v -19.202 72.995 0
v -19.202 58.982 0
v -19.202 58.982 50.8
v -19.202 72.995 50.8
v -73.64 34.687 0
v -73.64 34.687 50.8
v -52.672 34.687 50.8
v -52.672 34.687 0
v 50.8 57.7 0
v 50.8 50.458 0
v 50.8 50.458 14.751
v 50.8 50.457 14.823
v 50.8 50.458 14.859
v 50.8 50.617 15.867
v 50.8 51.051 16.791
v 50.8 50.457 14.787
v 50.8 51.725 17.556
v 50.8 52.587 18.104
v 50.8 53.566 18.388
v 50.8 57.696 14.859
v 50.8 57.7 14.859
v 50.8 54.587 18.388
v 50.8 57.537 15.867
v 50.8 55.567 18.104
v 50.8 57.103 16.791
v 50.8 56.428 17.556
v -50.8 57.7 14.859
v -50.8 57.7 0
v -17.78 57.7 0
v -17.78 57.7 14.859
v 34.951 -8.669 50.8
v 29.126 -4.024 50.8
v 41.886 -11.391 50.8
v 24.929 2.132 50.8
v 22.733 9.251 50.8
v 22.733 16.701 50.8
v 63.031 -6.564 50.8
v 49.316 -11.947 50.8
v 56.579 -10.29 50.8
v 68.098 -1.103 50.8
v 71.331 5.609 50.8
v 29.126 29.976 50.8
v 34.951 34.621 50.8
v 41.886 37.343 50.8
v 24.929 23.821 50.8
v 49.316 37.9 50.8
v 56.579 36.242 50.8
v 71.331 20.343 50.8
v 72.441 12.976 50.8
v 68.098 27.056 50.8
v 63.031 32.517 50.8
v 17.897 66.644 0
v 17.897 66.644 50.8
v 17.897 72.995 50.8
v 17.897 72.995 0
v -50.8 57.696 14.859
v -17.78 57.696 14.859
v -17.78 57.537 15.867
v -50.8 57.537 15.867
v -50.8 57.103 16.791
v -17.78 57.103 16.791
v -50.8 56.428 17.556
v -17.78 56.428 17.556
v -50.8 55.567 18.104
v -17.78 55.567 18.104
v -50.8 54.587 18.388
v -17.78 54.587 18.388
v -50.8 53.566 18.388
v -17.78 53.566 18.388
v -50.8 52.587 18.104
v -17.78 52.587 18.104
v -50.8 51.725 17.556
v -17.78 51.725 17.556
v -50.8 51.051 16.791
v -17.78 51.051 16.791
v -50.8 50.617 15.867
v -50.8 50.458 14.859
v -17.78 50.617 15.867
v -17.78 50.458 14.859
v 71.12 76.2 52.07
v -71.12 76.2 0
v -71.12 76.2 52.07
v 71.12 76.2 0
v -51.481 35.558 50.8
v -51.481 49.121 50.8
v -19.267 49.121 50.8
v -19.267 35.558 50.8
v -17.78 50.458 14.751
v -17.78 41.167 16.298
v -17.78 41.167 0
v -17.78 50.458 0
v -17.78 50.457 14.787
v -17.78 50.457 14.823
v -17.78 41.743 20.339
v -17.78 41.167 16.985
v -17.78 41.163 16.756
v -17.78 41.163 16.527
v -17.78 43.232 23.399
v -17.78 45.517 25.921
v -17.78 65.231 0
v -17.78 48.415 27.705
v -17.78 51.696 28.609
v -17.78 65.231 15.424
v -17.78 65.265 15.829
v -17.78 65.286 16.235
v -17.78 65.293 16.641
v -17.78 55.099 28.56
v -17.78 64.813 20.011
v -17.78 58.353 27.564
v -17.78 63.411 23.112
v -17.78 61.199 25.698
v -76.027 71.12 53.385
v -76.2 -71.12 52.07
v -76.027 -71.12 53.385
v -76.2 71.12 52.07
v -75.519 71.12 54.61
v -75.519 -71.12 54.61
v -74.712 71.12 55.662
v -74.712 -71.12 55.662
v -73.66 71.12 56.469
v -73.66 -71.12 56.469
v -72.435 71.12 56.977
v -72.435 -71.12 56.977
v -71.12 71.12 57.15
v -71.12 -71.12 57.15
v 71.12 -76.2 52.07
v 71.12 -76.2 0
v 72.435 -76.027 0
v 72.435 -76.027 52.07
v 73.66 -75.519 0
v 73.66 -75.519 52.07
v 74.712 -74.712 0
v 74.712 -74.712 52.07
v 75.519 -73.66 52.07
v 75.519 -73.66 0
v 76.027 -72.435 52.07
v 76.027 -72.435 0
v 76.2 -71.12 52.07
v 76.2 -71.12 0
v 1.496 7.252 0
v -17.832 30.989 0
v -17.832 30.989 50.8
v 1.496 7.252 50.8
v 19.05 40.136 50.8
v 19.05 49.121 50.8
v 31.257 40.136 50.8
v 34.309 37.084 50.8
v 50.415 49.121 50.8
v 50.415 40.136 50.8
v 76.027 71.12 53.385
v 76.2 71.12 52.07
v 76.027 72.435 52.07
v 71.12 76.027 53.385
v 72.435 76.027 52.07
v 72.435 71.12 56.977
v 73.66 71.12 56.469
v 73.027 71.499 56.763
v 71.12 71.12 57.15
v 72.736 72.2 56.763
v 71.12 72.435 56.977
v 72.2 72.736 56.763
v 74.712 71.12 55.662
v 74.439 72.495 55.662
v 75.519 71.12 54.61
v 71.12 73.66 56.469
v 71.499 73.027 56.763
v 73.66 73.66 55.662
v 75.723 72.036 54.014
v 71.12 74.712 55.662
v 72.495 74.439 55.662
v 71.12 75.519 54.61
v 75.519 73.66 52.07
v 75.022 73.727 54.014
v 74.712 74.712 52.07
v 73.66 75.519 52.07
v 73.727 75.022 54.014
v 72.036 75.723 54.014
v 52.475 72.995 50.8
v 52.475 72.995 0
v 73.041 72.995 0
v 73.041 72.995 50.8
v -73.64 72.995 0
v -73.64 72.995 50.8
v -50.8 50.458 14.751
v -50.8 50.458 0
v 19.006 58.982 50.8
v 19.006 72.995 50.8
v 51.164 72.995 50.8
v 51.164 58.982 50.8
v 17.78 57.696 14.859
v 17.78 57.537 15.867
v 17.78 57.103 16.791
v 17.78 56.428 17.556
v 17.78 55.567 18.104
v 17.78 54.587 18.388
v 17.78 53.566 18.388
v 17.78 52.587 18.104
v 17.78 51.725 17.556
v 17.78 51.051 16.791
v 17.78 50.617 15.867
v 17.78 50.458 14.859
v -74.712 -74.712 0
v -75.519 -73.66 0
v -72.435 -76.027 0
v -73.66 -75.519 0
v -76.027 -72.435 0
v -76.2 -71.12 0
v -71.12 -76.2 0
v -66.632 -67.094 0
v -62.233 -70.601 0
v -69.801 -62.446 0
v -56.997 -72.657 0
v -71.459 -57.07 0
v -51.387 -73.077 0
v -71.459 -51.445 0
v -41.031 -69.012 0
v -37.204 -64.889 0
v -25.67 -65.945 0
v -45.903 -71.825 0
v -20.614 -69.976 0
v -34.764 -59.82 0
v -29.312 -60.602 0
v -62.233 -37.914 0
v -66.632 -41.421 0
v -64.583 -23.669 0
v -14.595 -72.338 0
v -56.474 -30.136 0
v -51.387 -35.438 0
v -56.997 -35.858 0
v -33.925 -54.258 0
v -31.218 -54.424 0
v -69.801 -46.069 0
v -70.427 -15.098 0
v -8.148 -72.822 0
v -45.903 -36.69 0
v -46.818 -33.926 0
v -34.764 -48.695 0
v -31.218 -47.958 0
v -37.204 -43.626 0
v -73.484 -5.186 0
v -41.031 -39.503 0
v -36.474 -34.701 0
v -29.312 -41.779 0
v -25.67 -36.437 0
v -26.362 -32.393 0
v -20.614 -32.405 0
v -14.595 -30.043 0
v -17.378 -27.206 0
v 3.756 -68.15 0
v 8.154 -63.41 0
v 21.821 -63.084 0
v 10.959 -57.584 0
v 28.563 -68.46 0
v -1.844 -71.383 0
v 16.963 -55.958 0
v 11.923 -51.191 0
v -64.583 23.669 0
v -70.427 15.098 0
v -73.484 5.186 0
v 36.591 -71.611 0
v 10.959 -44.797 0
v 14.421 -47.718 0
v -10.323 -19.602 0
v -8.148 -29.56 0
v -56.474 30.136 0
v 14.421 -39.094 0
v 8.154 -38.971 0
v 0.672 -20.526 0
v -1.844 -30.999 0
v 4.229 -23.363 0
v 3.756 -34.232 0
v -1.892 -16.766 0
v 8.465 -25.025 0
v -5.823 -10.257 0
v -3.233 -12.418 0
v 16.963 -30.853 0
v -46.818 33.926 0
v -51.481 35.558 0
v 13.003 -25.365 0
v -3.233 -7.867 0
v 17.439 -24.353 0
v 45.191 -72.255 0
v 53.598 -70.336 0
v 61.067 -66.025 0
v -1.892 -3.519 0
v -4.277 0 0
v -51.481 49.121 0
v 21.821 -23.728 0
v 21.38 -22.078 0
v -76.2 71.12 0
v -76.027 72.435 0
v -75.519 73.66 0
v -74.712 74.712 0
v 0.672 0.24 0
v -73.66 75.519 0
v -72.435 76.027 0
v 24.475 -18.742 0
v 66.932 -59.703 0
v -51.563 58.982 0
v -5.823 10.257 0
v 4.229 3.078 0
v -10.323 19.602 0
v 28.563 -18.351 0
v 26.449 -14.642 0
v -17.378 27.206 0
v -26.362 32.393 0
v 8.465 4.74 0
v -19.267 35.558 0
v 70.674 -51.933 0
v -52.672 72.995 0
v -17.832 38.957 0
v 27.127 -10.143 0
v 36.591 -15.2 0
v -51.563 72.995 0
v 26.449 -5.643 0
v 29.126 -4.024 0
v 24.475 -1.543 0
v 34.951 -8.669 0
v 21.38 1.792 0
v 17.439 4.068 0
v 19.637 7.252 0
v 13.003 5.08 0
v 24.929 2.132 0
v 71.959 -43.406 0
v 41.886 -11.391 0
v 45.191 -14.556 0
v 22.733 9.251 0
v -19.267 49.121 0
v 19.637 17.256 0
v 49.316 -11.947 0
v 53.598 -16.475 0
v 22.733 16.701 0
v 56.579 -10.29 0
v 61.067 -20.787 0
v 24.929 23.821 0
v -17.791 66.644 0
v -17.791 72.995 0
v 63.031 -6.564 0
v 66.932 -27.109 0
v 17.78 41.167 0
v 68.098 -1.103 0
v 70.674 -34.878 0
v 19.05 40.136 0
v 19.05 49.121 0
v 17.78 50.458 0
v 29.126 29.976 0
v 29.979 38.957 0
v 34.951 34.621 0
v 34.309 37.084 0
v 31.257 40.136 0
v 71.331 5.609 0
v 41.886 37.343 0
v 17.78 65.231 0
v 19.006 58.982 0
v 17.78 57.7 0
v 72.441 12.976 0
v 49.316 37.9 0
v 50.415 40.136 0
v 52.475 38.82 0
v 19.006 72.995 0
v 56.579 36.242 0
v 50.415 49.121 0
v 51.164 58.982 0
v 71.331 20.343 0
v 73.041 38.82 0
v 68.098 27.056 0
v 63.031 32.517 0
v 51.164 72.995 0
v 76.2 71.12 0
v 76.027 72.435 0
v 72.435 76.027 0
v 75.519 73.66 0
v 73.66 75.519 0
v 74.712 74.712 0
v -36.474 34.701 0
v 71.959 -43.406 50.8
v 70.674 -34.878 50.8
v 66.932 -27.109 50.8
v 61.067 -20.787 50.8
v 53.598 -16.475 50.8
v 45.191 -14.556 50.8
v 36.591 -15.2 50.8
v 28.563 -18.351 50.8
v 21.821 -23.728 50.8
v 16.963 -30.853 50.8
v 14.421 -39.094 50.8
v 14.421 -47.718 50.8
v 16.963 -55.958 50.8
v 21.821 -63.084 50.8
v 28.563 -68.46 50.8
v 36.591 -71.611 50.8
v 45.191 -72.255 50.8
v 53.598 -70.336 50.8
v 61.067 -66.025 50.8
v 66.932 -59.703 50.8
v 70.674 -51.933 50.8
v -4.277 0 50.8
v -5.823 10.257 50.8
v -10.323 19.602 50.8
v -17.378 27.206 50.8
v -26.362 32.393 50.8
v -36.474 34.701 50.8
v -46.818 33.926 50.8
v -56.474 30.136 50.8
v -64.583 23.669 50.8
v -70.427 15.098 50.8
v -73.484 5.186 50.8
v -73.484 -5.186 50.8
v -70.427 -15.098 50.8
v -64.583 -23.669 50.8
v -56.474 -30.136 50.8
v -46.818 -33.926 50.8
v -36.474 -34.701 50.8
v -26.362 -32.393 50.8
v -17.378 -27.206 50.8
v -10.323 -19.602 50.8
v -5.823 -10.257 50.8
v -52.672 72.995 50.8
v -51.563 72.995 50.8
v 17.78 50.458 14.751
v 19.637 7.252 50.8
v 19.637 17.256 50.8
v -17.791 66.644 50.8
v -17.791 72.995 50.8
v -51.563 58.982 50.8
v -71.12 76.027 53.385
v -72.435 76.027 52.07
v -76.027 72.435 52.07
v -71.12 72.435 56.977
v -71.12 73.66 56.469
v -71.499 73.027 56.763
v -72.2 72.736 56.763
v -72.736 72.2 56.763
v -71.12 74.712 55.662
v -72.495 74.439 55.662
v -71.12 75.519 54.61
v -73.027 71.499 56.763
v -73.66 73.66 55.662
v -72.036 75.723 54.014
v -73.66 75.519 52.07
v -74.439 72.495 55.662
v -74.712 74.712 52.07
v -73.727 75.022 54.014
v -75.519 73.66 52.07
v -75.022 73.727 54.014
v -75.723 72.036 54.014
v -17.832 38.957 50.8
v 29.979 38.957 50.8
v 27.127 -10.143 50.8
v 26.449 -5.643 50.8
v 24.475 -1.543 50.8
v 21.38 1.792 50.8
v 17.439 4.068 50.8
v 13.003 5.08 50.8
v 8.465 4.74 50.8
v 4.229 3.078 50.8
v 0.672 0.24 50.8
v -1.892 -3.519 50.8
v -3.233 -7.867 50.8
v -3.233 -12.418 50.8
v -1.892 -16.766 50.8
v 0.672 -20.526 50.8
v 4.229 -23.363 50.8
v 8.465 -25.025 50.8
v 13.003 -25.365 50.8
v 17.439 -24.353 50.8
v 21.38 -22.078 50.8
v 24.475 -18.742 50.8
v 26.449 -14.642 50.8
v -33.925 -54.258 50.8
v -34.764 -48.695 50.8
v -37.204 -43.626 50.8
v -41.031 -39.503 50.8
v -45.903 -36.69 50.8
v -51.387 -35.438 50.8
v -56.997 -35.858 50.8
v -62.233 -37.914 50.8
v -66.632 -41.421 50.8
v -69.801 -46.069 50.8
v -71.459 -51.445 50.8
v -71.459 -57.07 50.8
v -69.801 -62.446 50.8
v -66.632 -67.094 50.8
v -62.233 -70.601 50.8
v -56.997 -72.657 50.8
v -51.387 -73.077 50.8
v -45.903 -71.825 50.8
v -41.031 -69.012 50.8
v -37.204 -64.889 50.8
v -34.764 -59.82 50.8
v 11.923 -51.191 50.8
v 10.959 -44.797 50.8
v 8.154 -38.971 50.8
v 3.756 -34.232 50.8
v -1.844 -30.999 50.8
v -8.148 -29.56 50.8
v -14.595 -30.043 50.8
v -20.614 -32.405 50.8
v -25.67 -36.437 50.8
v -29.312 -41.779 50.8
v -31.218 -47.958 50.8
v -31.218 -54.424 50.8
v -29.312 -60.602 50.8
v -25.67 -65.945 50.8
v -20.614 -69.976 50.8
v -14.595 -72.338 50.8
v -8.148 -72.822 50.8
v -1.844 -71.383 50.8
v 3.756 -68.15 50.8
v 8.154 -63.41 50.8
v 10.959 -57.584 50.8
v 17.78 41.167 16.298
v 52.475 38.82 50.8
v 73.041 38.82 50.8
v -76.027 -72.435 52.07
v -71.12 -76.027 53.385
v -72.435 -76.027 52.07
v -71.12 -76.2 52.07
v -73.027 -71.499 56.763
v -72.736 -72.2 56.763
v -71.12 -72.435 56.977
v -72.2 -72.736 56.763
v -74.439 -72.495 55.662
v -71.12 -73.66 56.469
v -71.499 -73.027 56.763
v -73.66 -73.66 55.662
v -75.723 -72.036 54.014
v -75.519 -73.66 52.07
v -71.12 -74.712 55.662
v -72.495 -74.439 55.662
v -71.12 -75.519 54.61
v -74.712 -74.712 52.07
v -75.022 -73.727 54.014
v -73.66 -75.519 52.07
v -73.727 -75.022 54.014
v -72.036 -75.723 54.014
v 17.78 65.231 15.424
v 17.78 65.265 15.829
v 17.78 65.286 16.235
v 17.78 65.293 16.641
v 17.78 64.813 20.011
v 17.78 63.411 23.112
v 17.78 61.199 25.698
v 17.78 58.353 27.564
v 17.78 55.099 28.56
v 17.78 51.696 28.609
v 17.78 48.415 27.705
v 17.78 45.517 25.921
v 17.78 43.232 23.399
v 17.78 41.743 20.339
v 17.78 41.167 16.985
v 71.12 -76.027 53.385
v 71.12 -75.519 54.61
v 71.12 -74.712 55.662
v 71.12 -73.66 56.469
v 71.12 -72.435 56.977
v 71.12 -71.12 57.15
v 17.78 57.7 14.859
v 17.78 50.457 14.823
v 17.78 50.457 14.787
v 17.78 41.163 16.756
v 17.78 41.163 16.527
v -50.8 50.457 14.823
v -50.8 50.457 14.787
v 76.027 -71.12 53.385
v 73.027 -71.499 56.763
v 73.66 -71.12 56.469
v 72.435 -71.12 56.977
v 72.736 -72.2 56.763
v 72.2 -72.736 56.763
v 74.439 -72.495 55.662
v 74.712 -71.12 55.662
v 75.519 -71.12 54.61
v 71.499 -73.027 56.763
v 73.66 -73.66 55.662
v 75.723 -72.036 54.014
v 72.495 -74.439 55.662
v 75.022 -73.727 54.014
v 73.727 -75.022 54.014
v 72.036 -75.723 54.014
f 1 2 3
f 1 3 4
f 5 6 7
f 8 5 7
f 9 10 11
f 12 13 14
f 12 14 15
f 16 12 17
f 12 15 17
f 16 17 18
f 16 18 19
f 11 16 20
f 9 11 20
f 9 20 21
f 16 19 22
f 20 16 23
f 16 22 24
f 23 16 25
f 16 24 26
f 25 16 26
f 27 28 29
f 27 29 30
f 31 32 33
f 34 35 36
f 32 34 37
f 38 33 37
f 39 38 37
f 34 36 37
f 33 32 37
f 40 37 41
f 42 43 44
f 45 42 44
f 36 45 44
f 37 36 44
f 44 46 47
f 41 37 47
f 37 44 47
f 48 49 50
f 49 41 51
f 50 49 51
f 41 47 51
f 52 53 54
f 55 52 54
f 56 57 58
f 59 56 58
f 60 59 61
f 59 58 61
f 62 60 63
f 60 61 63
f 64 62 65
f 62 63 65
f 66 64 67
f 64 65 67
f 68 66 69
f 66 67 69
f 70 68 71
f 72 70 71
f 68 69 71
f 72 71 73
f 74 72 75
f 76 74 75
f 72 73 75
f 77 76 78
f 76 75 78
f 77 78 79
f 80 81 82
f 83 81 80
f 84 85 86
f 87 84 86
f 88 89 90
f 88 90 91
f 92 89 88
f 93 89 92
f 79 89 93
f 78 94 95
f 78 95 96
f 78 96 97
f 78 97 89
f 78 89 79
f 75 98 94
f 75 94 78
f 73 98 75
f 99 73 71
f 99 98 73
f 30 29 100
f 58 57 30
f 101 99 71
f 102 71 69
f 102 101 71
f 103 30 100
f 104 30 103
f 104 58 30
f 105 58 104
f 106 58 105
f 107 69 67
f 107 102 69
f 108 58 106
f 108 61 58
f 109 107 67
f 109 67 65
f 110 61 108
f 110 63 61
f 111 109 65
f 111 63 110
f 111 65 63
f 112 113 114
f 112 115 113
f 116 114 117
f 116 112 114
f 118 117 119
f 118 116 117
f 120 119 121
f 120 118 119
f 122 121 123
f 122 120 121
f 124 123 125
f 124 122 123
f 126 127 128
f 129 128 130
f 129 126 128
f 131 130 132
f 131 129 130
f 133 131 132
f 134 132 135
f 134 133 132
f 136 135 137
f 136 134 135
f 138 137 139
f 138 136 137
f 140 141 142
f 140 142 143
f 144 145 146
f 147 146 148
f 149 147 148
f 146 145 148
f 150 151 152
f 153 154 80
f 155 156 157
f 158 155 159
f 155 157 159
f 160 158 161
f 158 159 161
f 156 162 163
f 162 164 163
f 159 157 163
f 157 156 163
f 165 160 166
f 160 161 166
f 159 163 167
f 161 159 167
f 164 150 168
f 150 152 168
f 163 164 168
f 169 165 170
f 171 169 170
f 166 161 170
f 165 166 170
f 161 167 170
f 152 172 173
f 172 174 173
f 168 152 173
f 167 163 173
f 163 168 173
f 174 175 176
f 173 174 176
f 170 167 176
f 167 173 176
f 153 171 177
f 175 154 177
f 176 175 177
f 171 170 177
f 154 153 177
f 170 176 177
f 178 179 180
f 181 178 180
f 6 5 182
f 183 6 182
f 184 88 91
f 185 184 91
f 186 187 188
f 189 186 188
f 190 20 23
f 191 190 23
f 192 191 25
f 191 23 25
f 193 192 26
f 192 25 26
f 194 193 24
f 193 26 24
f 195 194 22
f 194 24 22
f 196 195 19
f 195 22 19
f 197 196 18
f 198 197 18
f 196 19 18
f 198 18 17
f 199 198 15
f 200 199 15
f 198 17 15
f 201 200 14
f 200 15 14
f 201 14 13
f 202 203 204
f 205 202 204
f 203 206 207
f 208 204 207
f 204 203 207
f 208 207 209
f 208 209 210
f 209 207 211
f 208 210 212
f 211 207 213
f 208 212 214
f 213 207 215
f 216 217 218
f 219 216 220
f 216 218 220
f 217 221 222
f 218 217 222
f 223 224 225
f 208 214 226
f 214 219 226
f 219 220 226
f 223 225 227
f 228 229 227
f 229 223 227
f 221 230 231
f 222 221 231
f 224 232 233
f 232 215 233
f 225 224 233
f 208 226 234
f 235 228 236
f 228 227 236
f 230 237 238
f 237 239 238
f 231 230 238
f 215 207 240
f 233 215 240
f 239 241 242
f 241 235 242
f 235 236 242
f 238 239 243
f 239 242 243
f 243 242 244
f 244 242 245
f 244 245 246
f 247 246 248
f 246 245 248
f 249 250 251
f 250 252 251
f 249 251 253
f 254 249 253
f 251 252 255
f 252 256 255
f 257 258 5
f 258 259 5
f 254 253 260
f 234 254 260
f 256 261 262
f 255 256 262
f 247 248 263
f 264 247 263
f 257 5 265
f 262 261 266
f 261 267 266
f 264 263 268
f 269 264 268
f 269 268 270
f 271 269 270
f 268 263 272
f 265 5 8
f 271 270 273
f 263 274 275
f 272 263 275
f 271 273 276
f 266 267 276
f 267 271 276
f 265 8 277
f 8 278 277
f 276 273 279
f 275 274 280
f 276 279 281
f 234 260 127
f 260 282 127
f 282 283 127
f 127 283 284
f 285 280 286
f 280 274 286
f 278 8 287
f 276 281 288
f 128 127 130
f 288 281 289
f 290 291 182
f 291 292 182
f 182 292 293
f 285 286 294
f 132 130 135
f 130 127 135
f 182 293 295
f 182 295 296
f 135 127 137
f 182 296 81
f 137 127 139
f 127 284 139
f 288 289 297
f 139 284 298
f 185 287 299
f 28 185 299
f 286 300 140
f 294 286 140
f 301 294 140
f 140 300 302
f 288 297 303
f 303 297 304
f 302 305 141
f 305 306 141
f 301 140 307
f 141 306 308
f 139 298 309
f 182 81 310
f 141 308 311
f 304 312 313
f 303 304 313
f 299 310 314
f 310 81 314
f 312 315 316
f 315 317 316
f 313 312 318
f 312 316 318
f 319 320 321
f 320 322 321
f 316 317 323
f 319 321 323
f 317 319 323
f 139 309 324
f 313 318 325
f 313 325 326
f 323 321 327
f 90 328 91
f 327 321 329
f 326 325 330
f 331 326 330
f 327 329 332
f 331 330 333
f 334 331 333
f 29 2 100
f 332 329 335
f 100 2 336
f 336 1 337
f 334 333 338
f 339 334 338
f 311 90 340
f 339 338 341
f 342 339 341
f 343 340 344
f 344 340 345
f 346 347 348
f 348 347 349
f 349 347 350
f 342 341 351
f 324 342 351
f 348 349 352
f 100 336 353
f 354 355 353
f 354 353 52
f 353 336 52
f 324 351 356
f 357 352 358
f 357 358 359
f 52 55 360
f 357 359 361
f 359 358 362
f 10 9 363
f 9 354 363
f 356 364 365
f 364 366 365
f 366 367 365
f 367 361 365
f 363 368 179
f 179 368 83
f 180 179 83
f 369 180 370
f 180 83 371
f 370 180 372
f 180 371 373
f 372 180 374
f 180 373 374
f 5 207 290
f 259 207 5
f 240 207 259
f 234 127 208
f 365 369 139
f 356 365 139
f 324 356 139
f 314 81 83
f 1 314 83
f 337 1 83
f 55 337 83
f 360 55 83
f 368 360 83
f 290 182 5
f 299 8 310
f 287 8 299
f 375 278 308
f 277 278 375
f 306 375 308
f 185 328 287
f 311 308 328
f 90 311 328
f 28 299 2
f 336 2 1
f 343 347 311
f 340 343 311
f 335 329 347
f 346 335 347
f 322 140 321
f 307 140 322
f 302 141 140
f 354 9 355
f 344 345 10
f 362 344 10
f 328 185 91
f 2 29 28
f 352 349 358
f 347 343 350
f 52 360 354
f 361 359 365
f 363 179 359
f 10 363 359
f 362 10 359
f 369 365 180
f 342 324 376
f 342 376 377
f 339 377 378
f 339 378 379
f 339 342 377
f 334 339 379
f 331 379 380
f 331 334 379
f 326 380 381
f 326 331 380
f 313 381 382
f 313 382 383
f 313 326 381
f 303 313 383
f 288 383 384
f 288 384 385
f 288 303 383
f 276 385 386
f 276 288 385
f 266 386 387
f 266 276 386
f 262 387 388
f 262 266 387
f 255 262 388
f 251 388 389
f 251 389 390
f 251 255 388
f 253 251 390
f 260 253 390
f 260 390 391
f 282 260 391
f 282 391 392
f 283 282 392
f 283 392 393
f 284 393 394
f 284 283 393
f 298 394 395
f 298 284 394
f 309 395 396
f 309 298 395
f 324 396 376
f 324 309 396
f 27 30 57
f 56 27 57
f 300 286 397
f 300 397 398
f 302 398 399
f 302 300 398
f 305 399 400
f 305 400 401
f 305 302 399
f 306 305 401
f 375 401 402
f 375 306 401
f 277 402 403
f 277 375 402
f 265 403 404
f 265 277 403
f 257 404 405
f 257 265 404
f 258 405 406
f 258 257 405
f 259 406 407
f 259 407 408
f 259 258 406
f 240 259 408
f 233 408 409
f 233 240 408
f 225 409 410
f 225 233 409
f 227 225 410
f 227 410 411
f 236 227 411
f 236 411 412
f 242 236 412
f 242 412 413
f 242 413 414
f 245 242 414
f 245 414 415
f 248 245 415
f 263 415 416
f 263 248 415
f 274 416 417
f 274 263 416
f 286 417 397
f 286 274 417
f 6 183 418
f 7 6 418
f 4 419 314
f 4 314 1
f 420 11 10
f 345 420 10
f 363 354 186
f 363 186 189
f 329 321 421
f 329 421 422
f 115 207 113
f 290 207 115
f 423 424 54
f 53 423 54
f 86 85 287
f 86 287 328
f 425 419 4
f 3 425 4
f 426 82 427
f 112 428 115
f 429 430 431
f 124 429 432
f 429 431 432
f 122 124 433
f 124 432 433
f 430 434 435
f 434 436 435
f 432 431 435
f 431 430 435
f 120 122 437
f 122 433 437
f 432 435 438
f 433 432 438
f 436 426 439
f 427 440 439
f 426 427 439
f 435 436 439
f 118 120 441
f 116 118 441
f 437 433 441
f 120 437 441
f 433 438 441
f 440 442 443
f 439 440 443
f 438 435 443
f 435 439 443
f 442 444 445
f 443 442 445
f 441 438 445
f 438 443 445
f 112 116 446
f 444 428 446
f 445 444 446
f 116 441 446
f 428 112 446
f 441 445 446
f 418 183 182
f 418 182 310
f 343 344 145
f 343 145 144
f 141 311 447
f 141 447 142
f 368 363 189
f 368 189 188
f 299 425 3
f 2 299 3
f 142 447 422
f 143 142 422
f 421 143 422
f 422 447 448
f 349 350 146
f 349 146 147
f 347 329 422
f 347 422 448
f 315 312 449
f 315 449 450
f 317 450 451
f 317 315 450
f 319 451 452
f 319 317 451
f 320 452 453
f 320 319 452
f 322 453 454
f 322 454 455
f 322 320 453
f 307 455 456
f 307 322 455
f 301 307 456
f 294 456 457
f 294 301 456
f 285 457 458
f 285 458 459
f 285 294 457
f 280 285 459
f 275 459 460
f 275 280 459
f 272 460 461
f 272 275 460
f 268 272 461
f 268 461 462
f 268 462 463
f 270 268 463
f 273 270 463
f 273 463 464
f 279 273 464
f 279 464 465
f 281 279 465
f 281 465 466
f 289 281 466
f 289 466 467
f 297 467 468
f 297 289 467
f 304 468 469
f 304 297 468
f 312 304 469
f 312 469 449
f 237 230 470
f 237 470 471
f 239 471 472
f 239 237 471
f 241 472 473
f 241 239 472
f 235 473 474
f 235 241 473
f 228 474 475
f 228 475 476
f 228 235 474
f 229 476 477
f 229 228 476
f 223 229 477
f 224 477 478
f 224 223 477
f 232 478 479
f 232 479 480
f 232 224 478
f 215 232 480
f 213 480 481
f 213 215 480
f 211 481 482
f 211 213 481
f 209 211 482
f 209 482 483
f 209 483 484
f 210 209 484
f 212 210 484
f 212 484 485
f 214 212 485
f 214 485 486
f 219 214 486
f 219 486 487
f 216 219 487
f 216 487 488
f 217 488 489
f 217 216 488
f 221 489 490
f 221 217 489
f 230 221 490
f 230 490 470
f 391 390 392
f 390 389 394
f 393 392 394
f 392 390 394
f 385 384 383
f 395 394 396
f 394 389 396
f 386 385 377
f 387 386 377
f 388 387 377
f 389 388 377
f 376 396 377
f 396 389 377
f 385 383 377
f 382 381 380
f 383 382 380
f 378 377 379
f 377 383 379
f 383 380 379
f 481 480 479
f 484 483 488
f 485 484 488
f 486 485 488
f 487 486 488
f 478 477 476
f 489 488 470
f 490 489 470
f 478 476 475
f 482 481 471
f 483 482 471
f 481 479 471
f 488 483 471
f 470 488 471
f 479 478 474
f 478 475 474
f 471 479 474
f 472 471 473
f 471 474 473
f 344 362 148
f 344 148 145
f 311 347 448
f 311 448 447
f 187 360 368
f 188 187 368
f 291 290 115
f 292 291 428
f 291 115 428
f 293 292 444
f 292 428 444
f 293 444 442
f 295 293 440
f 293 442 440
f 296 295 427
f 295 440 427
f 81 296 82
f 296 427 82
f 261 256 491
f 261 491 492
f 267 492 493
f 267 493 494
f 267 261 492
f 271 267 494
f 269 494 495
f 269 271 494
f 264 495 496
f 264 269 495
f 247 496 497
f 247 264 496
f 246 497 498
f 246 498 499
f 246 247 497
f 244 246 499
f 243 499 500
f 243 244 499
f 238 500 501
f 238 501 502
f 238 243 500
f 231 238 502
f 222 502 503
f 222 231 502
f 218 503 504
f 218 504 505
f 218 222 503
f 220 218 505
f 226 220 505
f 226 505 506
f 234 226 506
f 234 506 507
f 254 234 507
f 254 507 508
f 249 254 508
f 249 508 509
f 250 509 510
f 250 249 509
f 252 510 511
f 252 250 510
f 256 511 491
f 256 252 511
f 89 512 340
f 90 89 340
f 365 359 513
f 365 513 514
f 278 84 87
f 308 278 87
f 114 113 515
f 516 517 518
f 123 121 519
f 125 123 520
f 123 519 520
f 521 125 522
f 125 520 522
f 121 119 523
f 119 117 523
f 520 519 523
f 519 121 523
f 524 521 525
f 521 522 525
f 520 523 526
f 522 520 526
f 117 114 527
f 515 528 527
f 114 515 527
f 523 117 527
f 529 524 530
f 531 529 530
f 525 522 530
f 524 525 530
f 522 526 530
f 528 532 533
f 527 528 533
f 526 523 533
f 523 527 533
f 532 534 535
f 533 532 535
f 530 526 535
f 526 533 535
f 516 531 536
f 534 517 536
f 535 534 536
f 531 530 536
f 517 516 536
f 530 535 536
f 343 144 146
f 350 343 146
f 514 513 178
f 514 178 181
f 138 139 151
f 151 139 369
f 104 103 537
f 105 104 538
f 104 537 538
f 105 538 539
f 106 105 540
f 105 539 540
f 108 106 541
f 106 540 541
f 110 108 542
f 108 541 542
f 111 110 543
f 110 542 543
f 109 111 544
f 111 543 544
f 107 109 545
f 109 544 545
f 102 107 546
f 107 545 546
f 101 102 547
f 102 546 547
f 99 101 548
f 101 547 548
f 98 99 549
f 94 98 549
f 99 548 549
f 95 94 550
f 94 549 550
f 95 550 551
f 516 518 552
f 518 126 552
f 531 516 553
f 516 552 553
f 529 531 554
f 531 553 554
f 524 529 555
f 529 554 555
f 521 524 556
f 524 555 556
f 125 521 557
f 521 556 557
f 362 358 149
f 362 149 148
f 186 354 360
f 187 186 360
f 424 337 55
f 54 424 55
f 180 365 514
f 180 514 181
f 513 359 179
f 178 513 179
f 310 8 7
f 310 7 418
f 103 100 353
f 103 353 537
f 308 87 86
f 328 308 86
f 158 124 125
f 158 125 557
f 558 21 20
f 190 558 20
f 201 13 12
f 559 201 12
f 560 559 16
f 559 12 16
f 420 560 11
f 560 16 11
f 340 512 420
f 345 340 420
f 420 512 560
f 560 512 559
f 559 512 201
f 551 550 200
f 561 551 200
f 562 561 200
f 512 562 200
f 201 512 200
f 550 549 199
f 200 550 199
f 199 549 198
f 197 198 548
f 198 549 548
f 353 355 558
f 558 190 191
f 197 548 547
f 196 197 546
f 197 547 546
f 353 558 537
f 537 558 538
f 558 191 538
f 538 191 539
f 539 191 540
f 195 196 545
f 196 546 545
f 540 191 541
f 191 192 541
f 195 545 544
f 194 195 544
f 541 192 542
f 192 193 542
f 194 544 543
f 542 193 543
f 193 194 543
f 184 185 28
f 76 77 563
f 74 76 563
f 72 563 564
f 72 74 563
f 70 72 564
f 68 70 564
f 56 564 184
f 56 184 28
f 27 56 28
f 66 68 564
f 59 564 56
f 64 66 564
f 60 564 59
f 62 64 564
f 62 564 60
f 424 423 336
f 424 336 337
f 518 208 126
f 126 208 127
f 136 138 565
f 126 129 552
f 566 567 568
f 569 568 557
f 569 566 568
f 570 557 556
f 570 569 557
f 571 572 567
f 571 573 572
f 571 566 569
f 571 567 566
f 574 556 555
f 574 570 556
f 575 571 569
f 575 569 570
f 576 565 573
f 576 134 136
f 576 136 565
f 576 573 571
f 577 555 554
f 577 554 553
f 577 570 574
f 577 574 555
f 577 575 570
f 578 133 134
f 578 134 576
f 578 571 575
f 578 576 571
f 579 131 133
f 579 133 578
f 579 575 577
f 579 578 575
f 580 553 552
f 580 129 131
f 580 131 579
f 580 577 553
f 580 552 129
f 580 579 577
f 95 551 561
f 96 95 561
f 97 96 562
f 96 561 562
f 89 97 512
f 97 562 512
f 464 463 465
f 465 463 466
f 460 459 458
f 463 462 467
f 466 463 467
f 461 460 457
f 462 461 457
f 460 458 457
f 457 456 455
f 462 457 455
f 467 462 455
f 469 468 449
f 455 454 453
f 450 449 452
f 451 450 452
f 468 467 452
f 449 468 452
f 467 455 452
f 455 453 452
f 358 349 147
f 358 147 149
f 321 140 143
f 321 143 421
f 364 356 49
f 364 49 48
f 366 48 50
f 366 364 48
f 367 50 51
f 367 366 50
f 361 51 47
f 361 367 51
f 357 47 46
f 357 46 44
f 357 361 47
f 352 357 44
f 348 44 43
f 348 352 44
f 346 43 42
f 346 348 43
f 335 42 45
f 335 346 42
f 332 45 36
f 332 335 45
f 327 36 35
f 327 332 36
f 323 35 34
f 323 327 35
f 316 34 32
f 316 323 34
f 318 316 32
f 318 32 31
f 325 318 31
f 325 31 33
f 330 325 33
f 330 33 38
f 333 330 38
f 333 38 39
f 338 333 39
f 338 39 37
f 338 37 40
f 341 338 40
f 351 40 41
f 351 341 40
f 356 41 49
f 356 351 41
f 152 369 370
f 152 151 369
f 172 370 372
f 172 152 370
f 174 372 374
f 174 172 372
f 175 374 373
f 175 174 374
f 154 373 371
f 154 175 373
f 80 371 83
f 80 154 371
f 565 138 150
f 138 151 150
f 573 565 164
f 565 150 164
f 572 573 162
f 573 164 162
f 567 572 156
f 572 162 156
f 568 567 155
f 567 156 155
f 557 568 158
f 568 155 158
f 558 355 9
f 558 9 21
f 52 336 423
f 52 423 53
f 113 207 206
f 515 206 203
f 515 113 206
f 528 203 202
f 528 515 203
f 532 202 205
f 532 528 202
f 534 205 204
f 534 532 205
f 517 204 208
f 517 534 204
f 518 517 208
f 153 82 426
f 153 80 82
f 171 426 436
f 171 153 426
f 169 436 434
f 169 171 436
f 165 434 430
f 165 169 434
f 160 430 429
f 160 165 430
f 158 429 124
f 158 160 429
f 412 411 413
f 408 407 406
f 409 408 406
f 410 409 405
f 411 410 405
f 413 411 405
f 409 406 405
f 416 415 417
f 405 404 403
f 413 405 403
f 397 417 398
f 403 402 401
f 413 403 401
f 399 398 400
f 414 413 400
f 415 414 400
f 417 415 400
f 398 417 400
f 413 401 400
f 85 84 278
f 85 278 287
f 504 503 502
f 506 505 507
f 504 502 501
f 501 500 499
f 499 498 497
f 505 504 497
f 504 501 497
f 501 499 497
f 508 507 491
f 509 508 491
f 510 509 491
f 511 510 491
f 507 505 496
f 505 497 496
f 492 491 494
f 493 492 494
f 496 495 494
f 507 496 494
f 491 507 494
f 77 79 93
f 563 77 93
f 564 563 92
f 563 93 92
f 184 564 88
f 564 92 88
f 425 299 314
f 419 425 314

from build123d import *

# Parameters (mm, degrees)
F0_W      = 152.4
F0_H      = 152.4
F1_DEPTH  = 57.15
F2_R      = 5.08
F3_R      = 18.8722
F3_R_2    = 21.6916
F3_R_3    = 28.9306
F3_R_4    = 34.798
F3_R_5    = 15.2654
F3_R_6    = 24.9936
F4_DEPTH  = 50.8
F6_DEPTH  = 17.78
F8_DEPTH  = 50.8
F9_W      = 20.9688283503
F9_H      = 38.3084379137
F9_W_2    = 32.3605462909
F9_H_2    = 14.012824744
F9_W_3    = 35.6873329729
F9_H_3    = 6.3511356711
F9_W_4    = 32.1589261293
F9_W_5    = 20.5655843019
F9_H_4    = 34.1751612723
F10_DEPTH = 50.8
F12_DEPTH = 50.8
F13_W     = 32.2134252638
F13_H     = 13.5635472834
F14_DEPTH = 50.8


with BuildPart() as f1:
    # F0 (on Top) → F1 (new body)
    with BuildSketch(Plane.XY):
        Rectangle(F0_W, F0_H)
    extrude(amount=F1_DEPTH)

    # F2
    f2_edges = [f1.edges().sort_by_distance(p)[0] for p in [
        (-76.2, -76.2, 28.575),
        (76.2, -76.2, 28.575),
        (76.2, 76.2, 28.575),
        (-76.2, 76.2, 28.575),
        (76.2, 0, 57.15),
        (0, 76.2, 57.15),
        (-76.2, 0, 57.15),
        (0, -76.2, 57.15),
    ]]
    fillet(f2_edges, radius=F2_R)

    # F3 (on Top) → F4 (cut)
    with BuildSketch(Plane.XY):
        with Locations((-52.7972951531, -54.257504642)):
            Circle(F3_R)
        with Locations((-9.7686620429, -51.1906966567)):
            Circle(F3_R_2)
        with Locations((43.0286340415, -43.4057191014)):
            Circle(F3_R_3)
        with Locations((-39.074651897, 0)):
            Circle(F3_R_4)
        with Locations((11.8619473651, -10.1426448673)):
            Circle(F3_R_5)
        with Locations((47.4477931857, 12.9763726145)):
            Circle(F3_R_6)
    extrude(amount=F4_DEPTH, mode=Mode.SUBTRACT)

    # F5 (on Right) → F6 (cut, symmetric)
    with BuildSketch(Plane.YZ):
        with BuildLine():
            ThreePointArc((65.2309656143, 15.4240769103), (65.2771394427, 16.0320044258), (65.2925438309, 16.6414882988))
            ThreePointArc((65.2925438309, 16.6414882988), (53.3991094682, 28.7052683959), (41.1674231956, 16.9845848792))
            Line((41.1674231956, 16.9845848792), (65.2309656143, 16.9845848792))
            Line((65.2309656143, 16.9845848792), (65.2309656143, 15.4240769103))
        make_face()
        with BuildLine():
            Line((41.1674231956, 16.2983917184), (41.1674231956, 16.9845848792))
            ThreePointArc((41.1674231956, 16.9845848792), (41.1625438309, 16.6414882988), (41.1674231956, 16.2983917184))
        make_face()
        with BuildLine():
            Line((65.2309656143, 16.9845848792), (41.1674231956, 16.9845848792))
            Line((41.1674231956, 16.9845848792), (41.1674231956, 16.2983917184))
            ThreePointArc((41.1674231956, 16.2983917184), (52.7894681686, 4.584444104), (65.2309656143, 15.4240769103))
            Line((65.2309656143, 15.4240769103), (65.2309656143, 16.9845848792))
        make_face()
        with BuildLine():
            Line((65.2309656143, 0), (65.2309656143, 15.4240769103))
            ThreePointArc((65.2309656143, 15.4240769103), (52.7894681686, 4.584444104), (41.1674231956, 16.2983917184))
            Line((41.1674231956, 16.2983917184), (41.1674231956, 0))
            Line((41.1674231956, 0), (65.2309656143, 0))
        make_face()
    extrude(amount=F6_DEPTH, both=True, mode=Mode.SUBTRACT)

    # F7 (on Right) → F8 (cut, symmetric)
    with BuildSketch(Plane.YZ):
        with BuildLine():
            ThreePointArc((50.4576266435, 14.7510202975), (54.1037261363, 11.1856242821), (57.6962237544, 14.8050235584))
            ThreePointArc((57.6962237544, 14.8050235584), (57.6961230307, 14.8320259403), (57.6958208653, 14.8590268194))
            Line((57.6958208653, 14.8590268194), (50.4576266435, 14.8590268194))
            Line((50.4576266435, 14.8590268194), (50.4576266435, 14.7510202975))
        make_face()
        with BuildLine():
            ThreePointArc((57.6958208653, 14.8590268194), (57.6961230307, 14.8320259403), (57.6962237544, 14.8050235584))
            ThreePointArc((57.6962237544, 14.8050235584), (54.1037261363, 11.1856242821), (50.4576266435, 14.7510202975))
            Line((50.4576266435, 14.7510202975), (50.4576266435, -1.8991571851))
            Line((50.4576266435, -1.8991571851), (57.7001795173, -1.8991571851))
            Line((57.7001795173, -1.8991571851), (57.7001795173, 14.8590268194))
            Line((57.7001795173, 14.8590268194), (57.6958208653, 14.8590268194))
        make_face()
        with BuildLine():
            Line((50.4576266435, 14.8590268194), (57.6958208653, 14.8590268194))
            ThreePointArc((57.6958208653, 14.8590268194), (54.0767237544, 18.4245235584), (50.4576266435, 14.8590268194))
        make_face()
        with BuildLine():
            ThreePointArc((50.4576266435, 14.8590268194), (50.4572237544, 14.8050235584), (50.4576266435, 14.7510202975))
            Line((50.4576266435, 14.7510202975), (50.4576266435, 14.8590268194))
        make_face()
    extrude(amount=F8_DEPTH, both=True, mode=Mode.SUBTRACT)

    # F9 (on Top) → F10 (cut)
    with BuildSketch(Plane.XY):
        with Locations((-63.155984506, 53.8409817964)):
            Rectangle(F9_W, F9_H)
        with Locations((-35.3823676705, 65.9887883812)):
            Rectangle(F9_W_2, F9_H_2)
        with Locations((0.0529354438, 69.8196329176)):
            Rectangle(F9_W_3, F9_H_3)
        with Locations((35.0849926472, 65.9887883812)):
            Rectangle(F9_W_4, F9_H_2)
        with Locations((62.7577975392, 55.9076201171)):
            Rectangle(F9_W_5, F9_H_4)
    extrude(amount=F10_DEPTH, mode=Mode.SUBTRACT)

    # F11 (on Top) → F12 (cut)
    with BuildSketch(Plane.XY):
        Polygon((29.9793016165, 38.9572679996), (-17.8322065622, 38.9572679996), (-17.8322065622, 30.9886820614), (1.4958502725, 7.2524729185), (19.6370966733, 7.2524729185), (19.6370966733, 17.255589366), align=None)
    extrude(amount=F12_DEPTH, mode=Mode.SUBTRACT)

    # F13 (on Top) → F14 (cut)
    with BuildSketch(Plane.XY):
        with Locations((-35.3740798309, 42.3396099359)):
            Rectangle(F13_W, F13_H)
        Polygon((50.4153631628, 49.1213835776), (19.0496556461, 49.1213835776), (19.0496556461, 40.1355363429), (31.2568470836, 40.1355363429), (34.3086458743, 37.0837338269), (50.4153631628, 40.1355363429), align=None)
    extrude(amount=F14_DEPTH, mode=Mode.SUBTRACT)


solid = f1.part
